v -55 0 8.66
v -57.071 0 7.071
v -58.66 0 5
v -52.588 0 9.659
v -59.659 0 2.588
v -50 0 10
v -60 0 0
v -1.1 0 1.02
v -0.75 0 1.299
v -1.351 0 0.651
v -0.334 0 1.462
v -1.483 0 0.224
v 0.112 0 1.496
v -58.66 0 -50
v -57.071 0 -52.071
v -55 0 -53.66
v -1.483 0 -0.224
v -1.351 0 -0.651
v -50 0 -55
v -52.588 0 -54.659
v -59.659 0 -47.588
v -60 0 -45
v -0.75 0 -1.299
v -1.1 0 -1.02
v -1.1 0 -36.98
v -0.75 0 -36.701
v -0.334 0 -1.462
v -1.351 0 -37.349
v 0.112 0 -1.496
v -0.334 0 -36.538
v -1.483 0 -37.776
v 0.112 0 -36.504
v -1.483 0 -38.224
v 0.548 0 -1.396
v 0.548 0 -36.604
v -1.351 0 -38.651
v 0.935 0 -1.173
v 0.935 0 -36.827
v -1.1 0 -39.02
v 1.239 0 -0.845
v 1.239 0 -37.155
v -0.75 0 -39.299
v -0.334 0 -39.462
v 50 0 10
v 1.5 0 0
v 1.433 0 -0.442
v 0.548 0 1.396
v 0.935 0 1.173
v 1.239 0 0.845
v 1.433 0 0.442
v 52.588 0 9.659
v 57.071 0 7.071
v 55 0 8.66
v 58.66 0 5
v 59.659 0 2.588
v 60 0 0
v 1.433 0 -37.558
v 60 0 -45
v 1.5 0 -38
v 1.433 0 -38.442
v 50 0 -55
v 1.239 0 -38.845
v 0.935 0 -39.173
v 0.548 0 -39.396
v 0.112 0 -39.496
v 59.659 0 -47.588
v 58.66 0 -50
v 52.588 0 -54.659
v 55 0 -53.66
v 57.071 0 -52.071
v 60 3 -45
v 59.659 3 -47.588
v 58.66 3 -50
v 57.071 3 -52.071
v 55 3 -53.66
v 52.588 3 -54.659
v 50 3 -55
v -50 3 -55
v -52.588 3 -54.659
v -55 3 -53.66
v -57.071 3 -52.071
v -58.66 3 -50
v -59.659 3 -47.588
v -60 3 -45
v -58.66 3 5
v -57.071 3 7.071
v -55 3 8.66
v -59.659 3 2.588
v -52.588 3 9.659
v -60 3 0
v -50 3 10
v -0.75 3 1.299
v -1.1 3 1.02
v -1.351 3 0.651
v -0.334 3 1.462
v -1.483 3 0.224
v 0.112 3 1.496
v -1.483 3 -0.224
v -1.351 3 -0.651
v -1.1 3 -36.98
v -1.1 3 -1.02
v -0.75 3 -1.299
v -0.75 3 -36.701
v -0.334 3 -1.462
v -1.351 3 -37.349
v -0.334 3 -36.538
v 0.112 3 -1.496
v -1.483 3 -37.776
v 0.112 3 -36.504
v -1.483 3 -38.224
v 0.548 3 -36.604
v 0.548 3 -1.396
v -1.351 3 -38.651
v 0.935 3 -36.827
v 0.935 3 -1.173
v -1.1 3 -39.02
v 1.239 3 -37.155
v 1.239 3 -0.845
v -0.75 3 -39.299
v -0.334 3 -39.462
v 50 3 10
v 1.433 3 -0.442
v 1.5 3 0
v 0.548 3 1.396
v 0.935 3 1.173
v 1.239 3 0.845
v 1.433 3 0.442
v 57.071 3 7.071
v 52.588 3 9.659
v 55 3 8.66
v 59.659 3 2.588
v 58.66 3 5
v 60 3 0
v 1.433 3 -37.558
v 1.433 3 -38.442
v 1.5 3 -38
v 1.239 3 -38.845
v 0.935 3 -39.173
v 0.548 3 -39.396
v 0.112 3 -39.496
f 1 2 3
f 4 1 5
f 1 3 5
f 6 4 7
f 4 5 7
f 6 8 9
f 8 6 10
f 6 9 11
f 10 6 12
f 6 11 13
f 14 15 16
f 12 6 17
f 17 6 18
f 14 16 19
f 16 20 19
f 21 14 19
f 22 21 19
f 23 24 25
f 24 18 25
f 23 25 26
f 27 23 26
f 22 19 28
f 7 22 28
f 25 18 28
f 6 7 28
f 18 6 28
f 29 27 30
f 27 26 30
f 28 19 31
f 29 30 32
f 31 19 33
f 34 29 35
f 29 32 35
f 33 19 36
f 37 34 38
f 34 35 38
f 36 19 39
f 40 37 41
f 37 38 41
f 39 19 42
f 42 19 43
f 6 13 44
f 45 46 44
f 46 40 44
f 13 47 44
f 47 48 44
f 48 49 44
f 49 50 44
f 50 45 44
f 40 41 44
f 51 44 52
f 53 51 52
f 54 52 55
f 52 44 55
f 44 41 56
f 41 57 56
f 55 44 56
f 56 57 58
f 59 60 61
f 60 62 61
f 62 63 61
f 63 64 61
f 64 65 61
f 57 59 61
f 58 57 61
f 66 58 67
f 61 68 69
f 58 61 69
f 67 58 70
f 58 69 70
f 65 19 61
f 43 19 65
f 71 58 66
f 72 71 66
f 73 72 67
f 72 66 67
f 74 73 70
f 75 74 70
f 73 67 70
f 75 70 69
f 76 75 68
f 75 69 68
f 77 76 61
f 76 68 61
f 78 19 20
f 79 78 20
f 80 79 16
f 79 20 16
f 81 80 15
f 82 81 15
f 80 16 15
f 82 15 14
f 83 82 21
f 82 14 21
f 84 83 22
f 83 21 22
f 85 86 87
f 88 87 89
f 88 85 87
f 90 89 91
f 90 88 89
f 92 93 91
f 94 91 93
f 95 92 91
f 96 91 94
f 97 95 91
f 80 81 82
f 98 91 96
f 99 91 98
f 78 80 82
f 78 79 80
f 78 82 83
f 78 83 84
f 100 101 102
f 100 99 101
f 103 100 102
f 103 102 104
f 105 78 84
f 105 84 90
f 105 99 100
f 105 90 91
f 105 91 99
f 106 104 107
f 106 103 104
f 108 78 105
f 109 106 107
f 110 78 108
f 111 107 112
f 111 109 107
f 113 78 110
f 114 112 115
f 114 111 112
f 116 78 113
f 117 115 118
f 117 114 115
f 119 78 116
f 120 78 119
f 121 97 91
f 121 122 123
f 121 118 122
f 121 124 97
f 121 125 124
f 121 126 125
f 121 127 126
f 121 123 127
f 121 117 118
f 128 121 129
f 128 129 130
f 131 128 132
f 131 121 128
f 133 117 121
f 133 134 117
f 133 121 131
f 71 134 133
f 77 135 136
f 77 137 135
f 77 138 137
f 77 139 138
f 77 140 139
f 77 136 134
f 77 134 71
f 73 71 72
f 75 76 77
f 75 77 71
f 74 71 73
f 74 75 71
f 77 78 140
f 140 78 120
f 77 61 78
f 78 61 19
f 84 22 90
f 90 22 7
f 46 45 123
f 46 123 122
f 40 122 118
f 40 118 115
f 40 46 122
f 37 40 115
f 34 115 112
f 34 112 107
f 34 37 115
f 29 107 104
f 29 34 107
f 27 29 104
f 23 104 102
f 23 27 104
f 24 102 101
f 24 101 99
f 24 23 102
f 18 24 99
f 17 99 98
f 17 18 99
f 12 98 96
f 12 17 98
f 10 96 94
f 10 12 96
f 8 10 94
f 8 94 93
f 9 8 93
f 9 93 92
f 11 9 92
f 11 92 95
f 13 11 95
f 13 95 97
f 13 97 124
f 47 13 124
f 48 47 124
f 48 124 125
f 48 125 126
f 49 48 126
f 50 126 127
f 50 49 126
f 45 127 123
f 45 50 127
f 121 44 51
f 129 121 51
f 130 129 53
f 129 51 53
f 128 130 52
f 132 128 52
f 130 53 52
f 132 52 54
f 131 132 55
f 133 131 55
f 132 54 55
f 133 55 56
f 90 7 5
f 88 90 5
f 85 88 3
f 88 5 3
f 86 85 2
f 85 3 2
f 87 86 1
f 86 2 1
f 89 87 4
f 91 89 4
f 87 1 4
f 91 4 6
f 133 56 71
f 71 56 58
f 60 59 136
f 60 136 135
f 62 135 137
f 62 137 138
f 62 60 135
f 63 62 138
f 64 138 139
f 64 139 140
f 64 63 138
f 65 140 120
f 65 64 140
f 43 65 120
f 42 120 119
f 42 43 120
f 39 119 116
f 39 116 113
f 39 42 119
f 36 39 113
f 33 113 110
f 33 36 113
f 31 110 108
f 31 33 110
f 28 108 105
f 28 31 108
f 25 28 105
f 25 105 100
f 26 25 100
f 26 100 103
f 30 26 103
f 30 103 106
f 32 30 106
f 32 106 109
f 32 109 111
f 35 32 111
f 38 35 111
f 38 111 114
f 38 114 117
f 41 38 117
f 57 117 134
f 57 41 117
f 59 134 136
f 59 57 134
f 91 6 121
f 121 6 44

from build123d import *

# Parameters (mm, degrees)
SKETCH1_R           = 1.5
BOSS_EXTRUDE1_DEPTH = 3


with BuildPart() as part:
    # Sketch1 → Boss-Extrude1 (new body)
    with BuildSketch(Plane(origin=(0, 0, 0), x_dir=(1, 0, 0), z_dir=(0, 1, 0))):
        with BuildLine():
            Line((-50, -10), (50, -10))
            ThreePointArc((50, -10), (57.071067812, -7.071067812), (60, 0))
            Line((60, 0), (60, 45))
            ThreePointArc((60, 45), (57.071067812, 52.071067812), (50, 55))
            Line((50, 55), (-50, 55))
            ThreePointArc((-50, 55), (-57.071067812, 52.071067812), (-60, 45))
            Line((-60, 45), (-60, 0))
            ThreePointArc((-60, 0), (-57.071067812, -7.071067812), (-50, -10))
        make_face()
        Circle(SKETCH1_R, mode=Mode.SUBTRACT)
        with Locations((0, 38)):
            Circle(SKETCH1_R, mode=Mode.SUBTRACT)
    extrude(amount=BOSS_EXTRUDE1_DEPTH)


solid = part.part
